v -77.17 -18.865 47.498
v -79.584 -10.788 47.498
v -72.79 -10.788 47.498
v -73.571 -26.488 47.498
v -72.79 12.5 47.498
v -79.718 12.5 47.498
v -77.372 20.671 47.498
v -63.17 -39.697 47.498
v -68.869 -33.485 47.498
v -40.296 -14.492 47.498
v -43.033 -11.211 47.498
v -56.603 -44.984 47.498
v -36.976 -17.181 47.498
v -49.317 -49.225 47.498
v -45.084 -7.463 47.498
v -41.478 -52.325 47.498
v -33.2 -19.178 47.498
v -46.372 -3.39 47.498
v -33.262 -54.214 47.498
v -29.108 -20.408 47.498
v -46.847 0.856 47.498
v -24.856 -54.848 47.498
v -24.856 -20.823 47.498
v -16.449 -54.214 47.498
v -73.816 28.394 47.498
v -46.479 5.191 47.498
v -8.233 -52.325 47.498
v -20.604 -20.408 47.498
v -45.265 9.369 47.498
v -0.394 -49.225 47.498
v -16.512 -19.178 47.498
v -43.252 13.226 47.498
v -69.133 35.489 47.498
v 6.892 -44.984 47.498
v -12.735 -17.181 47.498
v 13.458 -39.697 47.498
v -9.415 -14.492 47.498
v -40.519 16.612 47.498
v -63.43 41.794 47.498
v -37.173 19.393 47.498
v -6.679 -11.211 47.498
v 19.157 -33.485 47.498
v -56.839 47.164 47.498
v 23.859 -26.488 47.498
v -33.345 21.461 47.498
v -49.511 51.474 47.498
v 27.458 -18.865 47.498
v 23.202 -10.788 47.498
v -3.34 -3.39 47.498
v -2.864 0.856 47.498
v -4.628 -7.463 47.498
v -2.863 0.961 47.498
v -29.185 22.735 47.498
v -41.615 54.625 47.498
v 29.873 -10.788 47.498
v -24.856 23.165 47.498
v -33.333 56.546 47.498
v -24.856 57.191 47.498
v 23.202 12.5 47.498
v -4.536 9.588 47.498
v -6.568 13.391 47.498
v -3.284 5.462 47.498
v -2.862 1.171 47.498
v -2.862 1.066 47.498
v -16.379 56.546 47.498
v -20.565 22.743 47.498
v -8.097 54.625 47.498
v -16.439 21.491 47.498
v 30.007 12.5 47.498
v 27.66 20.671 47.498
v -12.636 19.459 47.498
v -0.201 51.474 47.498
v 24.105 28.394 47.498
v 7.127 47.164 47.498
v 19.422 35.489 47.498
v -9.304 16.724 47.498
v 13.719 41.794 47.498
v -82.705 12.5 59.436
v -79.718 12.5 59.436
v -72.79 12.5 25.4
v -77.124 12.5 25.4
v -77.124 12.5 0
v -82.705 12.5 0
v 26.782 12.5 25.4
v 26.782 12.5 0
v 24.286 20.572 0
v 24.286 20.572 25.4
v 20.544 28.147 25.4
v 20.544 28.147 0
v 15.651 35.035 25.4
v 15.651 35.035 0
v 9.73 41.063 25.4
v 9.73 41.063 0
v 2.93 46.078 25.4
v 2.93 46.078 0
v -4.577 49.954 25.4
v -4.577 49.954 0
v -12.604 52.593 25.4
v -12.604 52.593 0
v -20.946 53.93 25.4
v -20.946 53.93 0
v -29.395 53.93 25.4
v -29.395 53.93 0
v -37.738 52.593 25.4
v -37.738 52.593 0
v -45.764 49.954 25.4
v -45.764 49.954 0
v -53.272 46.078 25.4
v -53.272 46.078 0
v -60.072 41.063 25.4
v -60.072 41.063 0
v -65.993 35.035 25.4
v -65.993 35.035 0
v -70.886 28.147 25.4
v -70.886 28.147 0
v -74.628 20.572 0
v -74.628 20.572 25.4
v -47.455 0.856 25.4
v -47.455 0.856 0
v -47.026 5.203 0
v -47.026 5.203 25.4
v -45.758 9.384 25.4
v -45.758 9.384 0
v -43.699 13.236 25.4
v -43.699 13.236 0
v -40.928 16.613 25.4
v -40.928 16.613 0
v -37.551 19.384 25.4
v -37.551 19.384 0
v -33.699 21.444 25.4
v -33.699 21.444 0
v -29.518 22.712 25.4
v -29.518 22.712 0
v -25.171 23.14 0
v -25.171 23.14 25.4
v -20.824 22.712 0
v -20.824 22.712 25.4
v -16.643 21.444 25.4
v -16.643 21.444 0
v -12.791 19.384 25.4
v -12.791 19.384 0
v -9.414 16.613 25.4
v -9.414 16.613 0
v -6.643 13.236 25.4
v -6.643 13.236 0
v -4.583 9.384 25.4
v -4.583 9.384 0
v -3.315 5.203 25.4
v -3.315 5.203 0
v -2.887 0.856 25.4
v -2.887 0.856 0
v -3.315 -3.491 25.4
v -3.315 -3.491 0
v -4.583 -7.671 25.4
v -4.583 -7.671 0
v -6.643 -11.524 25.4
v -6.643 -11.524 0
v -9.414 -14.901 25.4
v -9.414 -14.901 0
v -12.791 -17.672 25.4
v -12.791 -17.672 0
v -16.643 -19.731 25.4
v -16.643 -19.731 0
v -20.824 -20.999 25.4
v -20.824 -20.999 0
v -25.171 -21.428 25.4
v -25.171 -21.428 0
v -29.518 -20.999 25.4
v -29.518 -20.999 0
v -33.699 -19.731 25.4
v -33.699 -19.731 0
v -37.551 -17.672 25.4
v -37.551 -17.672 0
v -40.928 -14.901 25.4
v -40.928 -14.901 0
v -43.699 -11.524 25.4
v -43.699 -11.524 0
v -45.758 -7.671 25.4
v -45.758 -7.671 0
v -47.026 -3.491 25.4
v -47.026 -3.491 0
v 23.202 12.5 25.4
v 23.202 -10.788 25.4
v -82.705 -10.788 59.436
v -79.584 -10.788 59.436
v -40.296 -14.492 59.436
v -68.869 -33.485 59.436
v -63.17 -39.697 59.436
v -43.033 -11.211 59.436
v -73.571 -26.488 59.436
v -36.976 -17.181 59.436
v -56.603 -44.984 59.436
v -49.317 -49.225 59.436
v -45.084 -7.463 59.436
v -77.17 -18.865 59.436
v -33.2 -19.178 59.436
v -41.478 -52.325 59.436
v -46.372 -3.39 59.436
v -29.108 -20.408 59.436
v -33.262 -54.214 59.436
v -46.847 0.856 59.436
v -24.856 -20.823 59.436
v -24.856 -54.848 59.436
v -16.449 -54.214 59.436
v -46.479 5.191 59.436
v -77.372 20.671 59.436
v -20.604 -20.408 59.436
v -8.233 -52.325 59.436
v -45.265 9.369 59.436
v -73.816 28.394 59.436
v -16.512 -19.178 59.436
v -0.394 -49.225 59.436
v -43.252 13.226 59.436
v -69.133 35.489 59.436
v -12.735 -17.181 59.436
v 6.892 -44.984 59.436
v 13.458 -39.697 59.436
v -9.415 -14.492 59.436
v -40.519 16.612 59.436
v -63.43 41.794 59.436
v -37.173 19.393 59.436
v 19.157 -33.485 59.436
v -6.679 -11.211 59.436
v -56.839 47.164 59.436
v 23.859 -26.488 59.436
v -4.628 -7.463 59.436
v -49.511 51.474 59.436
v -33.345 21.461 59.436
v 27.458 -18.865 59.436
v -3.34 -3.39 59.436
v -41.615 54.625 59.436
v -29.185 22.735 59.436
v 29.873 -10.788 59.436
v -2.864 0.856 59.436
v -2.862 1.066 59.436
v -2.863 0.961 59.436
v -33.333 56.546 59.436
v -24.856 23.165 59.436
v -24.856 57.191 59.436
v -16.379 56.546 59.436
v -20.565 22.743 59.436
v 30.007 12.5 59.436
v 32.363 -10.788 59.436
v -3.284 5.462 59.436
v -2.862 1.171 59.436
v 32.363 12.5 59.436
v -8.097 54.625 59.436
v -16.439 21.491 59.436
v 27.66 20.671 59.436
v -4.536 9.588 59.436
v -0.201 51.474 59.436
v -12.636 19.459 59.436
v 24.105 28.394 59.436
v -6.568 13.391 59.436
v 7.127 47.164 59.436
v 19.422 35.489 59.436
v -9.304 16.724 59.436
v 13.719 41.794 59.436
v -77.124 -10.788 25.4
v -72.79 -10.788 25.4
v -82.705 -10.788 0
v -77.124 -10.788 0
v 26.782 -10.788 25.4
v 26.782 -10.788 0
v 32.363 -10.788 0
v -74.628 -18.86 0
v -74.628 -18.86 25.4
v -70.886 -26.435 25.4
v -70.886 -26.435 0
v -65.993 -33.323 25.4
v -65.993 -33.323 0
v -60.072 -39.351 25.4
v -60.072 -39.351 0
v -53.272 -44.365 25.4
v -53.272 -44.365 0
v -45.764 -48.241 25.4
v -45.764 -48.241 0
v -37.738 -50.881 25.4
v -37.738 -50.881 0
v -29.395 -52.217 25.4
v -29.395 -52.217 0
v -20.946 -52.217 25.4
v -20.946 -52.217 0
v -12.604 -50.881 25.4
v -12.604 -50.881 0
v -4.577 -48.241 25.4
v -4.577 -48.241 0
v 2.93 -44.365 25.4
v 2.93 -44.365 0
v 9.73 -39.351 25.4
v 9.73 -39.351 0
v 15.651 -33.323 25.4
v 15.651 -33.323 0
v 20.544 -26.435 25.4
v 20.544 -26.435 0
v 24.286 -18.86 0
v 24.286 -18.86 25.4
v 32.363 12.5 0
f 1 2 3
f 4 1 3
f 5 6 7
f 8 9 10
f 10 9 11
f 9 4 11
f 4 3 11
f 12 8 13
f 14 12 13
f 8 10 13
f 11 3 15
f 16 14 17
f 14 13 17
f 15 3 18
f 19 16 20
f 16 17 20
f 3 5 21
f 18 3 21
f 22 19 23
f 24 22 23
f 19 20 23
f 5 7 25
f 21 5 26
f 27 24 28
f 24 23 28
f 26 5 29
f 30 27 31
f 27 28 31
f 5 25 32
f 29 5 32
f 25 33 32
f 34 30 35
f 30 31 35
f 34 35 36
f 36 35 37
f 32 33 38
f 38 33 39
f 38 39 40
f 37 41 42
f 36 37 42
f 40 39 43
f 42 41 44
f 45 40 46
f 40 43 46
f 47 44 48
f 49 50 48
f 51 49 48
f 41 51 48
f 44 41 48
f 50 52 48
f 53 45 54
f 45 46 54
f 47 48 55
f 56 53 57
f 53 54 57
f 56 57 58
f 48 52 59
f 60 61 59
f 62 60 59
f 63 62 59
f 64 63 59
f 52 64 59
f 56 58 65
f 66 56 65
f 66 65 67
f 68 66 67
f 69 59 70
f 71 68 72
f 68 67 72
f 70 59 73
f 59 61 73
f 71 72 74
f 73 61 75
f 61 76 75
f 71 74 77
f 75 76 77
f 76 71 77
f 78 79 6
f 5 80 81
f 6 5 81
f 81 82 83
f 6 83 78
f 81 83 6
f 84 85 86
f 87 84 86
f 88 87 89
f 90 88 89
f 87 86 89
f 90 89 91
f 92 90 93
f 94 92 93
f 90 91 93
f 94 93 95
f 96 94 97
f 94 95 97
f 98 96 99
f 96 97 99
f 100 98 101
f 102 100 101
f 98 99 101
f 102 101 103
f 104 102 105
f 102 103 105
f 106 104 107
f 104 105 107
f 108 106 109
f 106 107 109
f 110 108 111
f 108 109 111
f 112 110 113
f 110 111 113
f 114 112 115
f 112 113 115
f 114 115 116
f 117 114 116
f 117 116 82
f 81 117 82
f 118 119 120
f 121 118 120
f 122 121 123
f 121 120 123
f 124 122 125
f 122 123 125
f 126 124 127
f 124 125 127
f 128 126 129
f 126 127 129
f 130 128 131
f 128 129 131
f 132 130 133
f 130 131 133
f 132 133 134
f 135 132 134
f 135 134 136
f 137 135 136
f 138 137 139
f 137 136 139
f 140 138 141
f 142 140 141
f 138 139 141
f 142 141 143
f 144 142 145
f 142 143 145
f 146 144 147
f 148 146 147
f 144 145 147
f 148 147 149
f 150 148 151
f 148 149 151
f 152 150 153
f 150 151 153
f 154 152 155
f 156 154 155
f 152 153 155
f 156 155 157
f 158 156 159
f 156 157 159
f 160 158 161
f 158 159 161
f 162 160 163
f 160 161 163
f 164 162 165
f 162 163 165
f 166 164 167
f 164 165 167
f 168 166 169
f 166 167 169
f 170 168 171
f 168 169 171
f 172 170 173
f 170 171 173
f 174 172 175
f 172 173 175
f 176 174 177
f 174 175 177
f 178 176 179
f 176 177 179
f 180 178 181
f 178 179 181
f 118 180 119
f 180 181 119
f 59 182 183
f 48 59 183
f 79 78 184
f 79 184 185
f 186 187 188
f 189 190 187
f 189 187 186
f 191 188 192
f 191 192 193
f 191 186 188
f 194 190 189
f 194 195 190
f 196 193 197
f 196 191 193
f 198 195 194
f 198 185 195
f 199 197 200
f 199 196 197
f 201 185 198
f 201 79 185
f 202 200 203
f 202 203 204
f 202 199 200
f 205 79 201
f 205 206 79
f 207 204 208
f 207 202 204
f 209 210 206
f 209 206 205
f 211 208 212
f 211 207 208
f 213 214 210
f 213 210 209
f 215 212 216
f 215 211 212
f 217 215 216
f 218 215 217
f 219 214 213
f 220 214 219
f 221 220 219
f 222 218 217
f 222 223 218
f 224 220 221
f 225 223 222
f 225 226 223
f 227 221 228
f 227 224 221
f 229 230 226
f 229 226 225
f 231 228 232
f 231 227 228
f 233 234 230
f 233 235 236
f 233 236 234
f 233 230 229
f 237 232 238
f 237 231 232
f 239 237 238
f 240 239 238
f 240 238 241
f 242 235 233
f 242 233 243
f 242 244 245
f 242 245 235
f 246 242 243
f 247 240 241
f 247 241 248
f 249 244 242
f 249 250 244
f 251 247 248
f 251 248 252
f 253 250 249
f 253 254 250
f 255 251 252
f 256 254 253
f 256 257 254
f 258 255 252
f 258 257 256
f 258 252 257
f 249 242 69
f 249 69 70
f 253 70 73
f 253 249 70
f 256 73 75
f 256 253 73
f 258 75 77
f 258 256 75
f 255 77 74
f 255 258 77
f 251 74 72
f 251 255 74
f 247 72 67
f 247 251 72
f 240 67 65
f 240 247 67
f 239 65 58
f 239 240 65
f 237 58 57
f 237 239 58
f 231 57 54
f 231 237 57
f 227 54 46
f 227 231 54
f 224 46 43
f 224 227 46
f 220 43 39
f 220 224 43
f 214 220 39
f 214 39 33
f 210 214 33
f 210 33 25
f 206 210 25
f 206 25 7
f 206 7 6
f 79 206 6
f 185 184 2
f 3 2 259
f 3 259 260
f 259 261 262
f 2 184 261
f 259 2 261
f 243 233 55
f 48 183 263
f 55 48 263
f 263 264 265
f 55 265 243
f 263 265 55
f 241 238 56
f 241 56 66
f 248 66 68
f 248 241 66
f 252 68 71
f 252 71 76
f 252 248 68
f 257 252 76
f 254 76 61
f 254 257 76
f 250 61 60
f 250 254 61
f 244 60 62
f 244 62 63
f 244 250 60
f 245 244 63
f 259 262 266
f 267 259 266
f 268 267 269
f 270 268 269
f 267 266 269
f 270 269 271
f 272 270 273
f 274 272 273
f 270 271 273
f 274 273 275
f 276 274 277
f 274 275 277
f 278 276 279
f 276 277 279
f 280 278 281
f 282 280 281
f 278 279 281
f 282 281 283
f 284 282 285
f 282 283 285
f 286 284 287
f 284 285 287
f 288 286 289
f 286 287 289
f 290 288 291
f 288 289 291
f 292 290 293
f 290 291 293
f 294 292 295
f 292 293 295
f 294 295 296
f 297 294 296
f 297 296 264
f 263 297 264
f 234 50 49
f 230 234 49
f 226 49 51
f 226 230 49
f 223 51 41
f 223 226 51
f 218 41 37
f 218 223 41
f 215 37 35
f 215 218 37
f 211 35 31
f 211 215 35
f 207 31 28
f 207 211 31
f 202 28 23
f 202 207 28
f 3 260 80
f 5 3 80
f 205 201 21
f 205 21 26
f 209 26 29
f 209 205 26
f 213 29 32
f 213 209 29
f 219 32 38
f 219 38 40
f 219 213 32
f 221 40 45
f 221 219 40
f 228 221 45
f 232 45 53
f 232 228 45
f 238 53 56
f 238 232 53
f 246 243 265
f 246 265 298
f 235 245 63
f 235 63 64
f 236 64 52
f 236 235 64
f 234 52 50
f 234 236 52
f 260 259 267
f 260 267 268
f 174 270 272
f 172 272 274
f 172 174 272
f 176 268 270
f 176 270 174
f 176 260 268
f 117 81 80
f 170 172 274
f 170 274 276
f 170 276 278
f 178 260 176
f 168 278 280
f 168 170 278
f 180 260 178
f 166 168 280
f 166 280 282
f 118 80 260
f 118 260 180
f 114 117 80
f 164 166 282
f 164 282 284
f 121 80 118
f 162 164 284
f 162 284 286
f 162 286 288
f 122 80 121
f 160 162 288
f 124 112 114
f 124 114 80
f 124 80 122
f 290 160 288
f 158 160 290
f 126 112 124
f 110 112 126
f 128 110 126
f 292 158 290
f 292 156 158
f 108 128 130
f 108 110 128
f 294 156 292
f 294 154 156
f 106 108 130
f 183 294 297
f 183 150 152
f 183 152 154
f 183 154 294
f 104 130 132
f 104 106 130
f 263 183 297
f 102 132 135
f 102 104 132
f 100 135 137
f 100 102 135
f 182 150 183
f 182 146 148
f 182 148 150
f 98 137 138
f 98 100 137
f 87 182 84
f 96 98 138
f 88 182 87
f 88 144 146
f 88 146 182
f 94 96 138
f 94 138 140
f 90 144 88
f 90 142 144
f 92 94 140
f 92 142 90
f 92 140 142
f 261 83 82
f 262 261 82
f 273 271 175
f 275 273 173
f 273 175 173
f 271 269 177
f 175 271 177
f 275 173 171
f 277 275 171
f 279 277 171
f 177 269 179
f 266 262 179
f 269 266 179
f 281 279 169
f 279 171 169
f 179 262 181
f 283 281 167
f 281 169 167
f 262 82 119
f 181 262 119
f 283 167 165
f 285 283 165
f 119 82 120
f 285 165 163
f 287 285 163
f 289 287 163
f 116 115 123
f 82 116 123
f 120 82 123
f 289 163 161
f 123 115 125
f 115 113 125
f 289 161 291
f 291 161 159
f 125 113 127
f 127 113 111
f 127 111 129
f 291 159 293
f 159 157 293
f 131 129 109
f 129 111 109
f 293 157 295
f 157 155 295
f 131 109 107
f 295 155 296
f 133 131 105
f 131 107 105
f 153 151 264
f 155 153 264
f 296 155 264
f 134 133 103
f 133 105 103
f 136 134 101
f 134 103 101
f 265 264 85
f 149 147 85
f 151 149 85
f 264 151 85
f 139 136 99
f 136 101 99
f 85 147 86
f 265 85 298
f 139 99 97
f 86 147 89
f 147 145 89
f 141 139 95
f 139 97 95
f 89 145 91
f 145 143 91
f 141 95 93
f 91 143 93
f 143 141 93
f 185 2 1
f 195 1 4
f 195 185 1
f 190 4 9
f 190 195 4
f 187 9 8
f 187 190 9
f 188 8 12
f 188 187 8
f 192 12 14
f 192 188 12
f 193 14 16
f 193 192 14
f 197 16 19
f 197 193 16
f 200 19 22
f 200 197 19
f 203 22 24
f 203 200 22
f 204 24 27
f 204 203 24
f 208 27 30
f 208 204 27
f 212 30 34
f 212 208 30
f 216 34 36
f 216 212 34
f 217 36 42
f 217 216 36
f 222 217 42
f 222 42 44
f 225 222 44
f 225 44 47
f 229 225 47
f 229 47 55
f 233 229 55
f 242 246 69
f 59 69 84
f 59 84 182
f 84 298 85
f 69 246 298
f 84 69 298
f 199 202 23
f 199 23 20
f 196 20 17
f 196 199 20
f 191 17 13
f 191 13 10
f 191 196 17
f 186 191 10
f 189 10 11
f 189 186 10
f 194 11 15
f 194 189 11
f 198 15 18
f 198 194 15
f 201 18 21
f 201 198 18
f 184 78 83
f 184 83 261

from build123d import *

# Parameters (mm, degrees)
F1_DEPTH = 25.4
F3_DEPTH = 34.036
F5_DEPTH = 11.938


with BuildPart() as f1:
    # F0 (on Top) → F1 (new body)
    with BuildSketch(Plane.XY):
        with BuildLine():
            Line((17.636783421, 0.8561543655), (-2.8872299848, 0.8561543655))
            ThreePointArc((-2.8872299848, 0.8561543655), (-25.1709409058, -21.4275565556), (-47.4546518269, 0.8561543655))
            Line((-47.4546518269, 0.8561543655), (-67.9786652327, 0.8561543655))
            Line((-67.9786652327, 0.8561543655), (-67.9786652327, -10.787546169))
            Line((-67.9786652327, -10.787546169), (-77.1236439758, -10.787546169))
            ThreePointArc((-77.1236439758, -10.787546169), (-25.1709409058, -52.3853625026), (26.7817621641, -10.787546169))
            Line((26.7817621641, -10.787546169), (17.636783421, -10.787546169))
            Line((17.636783421, -10.787546169), (17.636783421, 0.8561543655))
        make_face()
        with BuildLine():
            ThreePointArc((-47.4546518269, 0.8561543655), (-25.1709409058, 23.1398652865), (-2.8872299848, 0.8561543655))
            Line((-2.8872299848, 0.8561543655), (17.636783421, 0.8561543655))
            Line((17.636783421, 0.8561543655), (17.636783421, 12.4998548999))
            Line((17.636783421, 12.4998548999), (26.7817621641, 12.4998548999))
            ThreePointArc((26.7817621641, 12.4998548999), (-25.1709409058, 54.0976712335), (-77.1236439758, 12.4998548999))
            Line((-77.1236439758, 12.4998548999), (-67.9786652327, 12.4998548999))
            Line((-67.9786652327, 12.4998548999), (-67.9786652327, 0.8561543655))
            Line((-67.9786652327, 0.8561543655), (-47.4546518269, 0.8561543655))
        make_face()
        with BuildLine():
            Line((-67.9786652327, -10.787546169), (-67.9786652327, 0.8561543655))
            Line((-67.9786652327, 0.8561543655), (-78.4124577739, 0.8561543655))
            ThreePointArc((-78.4124577739, 0.8561543655), (-78.0892734346, -5.0012512706), (-77.1236439758, -10.787546169))
            Line((-77.1236439758, -10.787546169), (-67.9786652327, -10.787546169))
        make_face()
        with BuildLine():
            Line((-78.4124577739, 0.8561543655), (-67.9786652327, 0.8561543655))
            Line((-67.9786652327, 0.8561543655), (-67.9786652327, 12.4998548999))
            Line((-67.9786652327, 12.4998548999), (-77.1236439758, 12.4998548999))
            ThreePointArc((-77.1236439758, 12.4998548999), (-78.0892734346, 6.7135600016), (-78.4124577739, 0.8561543655))
        make_face()
        with BuildLine():
            Line((-82.7045142651, 0.8561543655), (-78.4124577739, 0.8561543655))
            ThreePointArc((-78.4124577739, 0.8561543655), (-78.0892734346, 6.7135600016), (-77.1236439758, 12.4998548999))
            Line((-77.1236439758, 12.4998548999), (-82.7045142651, 12.4998548999))
            Line((-82.7045142651, 12.4998548999), (-82.7045142651, 0.8561543655))
        make_face()
        with BuildLine():
            ThreePointArc((-77.1236439758, -10.787546169), (-78.0892734346, -5.0012512706), (-78.4124577739, 0.8561543655))
            Line((-78.4124577739, 0.8561543655), (-82.7045142651, 0.8561543655))
            Line((-82.7045142651, 0.8561543655), (-82.7045142651, -10.787546169))
            Line((-82.7045142651, -10.787546169), (-77.1236439758, -10.787546169))
        make_face()
        with BuildLine():
            ThreePointArc((26.7817621641, 12.4998548999), (27.747391623, 6.7135600016), (28.0705759622, 0.8561543655))
            Line((28.0705759622, 0.8561543655), (32.3626324534, 0.8561543655))
            Line((32.3626324534, 0.8561543655), (32.3626324534, 12.4998548999))
            Line((32.3626324534, 12.4998548999), (26.7817621641, 12.4998548999))
        make_face()
        with BuildLine():
            Line((32.3626324534, 0.8561543655), (28.0705759622, 0.8561543655))
            ThreePointArc((28.0705759622, 0.8561543655), (27.747391623, -5.0012512706), (26.7817621641, -10.787546169))
            Line((26.7817621641, -10.787546169), (32.3626324534, -10.787546169))
            Line((32.3626324534, -10.787546169), (32.3626324534, 0.8561543655))
        make_face()
        with BuildLine():
            Line((28.0705759622, 0.8561543655), (17.636783421, 0.8561543655))
            Line((17.636783421, 0.8561543655), (17.636783421, -10.787546169))
            Line((17.636783421, -10.787546169), (26.7817621641, -10.787546169))
            ThreePointArc((26.7817621641, -10.787546169), (27.747391623, -5.0012512706), (28.0705759622, 0.8561543655))
        make_face()
        with BuildLine():
            Line((17.636783421, 12.4998548999), (17.636783421, 0.8561543655))
            Line((17.636783421, 0.8561543655), (28.0705759622, 0.8561543655))
            ThreePointArc((28.0705759622, 0.8561543655), (27.747391623, 6.7135600016), (26.7817621641, 12.4998548999))
            Line((26.7817621641, 12.4998548999), (17.636783421, 12.4998548999))
        make_face()
    extrude(amount=F1_DEPTH)

    # F2 (on face) → F3 (join)
    with BuildSketch(Plane.XY.offset(25.4)):
        Polygon((-77.1236439758, 12.4998548999), (-82.7045142651, 12.4998548999), (-82.7045142651, -10.787546169), (-77.1236439758, -10.787546169), (-72.7896168828, -10.787546169), (-72.7896168828, 12.4998548999), align=None)
        Polygon((32.3626324534, 12.4998548999), (26.7817621641, 12.4998548999), (23.2018940151, 12.4998548999), (23.2018940151, -10.787546169), (26.7817621641, -10.787546169), (32.3626324534, -10.787546169), align=None)
    extrude(amount=F3_DEPTH)

    # F4 (on face) → F5 (join)
    with BuildSketch(Plane.XY.offset(59.436)):
        with BuildLine():
            Line((-46.8474674883, 0.8561543655), (-72.7896168828, 0.8561543655))
            Line((-72.7896168828, 0.8561543655), (-72.7896168828, -10.787546169))
            Line((-72.7896168828, -10.787546169), (-79.5839477761, -10.787546169))
            ThreePointArc((-79.5839477761, -10.787546169), (-18.9982000681, -54.5411442591), (31.1630347279, 0.8561543655))
            Line((31.1630347279, 0.8561543655), (-2.8639275667, 0.8561543655))
            ThreePointArc((-2.8639275667, 0.8561543655), (-9.4154283034, -14.4917875948), (-24.8556975275, -20.8226303985))
            ThreePointArc((-24.8556975275, -20.8226303985), (-40.2959667516, -14.4917875948), (-46.8474674883, 0.8561543655))
        make_face()
        with BuildLine():
            Line((-72.7896168828, 12.4998548999), (-72.7896168828, 0.8561543655))
            Line((-72.7896168828, 0.8561543655), (-46.8474674883, 0.8561543655))
            ThreePointArc((-46.8474674883, 0.8561543655), (-40.5188840302, 16.611668132), (-24.8556975275, 23.1654282143))
            ThreePointArc((-24.8556975275, 23.1654282143), (-9.3035702594, 16.7235261761), (-2.8616682211, 1.1713989079))
            ThreePointArc((-2.8616682211, 1.1713989079), (-2.8622330648, 1.0137725886), (-2.8639275667, 0.8561543655))
            Line((-2.8639275667, 0.8561543655), (31.1630347279, 0.8561543655))
            ThreePointArc((31.1630347279, 0.8561543655), (31.1636999848, 1.0137760127), (31.1639217377, 1.1713989079))
            ThreePointArc((31.1639217377, 1.1713989079), (-19.1619844457, 56.9009186794), (-79.717923398, 12.4998548999))
            Line((-79.717923398, 12.4998548999), (-72.7896168828, 12.4998548999))
        make_face()
    extrude(amount=-F5_DEPTH)


solid = f1.part
